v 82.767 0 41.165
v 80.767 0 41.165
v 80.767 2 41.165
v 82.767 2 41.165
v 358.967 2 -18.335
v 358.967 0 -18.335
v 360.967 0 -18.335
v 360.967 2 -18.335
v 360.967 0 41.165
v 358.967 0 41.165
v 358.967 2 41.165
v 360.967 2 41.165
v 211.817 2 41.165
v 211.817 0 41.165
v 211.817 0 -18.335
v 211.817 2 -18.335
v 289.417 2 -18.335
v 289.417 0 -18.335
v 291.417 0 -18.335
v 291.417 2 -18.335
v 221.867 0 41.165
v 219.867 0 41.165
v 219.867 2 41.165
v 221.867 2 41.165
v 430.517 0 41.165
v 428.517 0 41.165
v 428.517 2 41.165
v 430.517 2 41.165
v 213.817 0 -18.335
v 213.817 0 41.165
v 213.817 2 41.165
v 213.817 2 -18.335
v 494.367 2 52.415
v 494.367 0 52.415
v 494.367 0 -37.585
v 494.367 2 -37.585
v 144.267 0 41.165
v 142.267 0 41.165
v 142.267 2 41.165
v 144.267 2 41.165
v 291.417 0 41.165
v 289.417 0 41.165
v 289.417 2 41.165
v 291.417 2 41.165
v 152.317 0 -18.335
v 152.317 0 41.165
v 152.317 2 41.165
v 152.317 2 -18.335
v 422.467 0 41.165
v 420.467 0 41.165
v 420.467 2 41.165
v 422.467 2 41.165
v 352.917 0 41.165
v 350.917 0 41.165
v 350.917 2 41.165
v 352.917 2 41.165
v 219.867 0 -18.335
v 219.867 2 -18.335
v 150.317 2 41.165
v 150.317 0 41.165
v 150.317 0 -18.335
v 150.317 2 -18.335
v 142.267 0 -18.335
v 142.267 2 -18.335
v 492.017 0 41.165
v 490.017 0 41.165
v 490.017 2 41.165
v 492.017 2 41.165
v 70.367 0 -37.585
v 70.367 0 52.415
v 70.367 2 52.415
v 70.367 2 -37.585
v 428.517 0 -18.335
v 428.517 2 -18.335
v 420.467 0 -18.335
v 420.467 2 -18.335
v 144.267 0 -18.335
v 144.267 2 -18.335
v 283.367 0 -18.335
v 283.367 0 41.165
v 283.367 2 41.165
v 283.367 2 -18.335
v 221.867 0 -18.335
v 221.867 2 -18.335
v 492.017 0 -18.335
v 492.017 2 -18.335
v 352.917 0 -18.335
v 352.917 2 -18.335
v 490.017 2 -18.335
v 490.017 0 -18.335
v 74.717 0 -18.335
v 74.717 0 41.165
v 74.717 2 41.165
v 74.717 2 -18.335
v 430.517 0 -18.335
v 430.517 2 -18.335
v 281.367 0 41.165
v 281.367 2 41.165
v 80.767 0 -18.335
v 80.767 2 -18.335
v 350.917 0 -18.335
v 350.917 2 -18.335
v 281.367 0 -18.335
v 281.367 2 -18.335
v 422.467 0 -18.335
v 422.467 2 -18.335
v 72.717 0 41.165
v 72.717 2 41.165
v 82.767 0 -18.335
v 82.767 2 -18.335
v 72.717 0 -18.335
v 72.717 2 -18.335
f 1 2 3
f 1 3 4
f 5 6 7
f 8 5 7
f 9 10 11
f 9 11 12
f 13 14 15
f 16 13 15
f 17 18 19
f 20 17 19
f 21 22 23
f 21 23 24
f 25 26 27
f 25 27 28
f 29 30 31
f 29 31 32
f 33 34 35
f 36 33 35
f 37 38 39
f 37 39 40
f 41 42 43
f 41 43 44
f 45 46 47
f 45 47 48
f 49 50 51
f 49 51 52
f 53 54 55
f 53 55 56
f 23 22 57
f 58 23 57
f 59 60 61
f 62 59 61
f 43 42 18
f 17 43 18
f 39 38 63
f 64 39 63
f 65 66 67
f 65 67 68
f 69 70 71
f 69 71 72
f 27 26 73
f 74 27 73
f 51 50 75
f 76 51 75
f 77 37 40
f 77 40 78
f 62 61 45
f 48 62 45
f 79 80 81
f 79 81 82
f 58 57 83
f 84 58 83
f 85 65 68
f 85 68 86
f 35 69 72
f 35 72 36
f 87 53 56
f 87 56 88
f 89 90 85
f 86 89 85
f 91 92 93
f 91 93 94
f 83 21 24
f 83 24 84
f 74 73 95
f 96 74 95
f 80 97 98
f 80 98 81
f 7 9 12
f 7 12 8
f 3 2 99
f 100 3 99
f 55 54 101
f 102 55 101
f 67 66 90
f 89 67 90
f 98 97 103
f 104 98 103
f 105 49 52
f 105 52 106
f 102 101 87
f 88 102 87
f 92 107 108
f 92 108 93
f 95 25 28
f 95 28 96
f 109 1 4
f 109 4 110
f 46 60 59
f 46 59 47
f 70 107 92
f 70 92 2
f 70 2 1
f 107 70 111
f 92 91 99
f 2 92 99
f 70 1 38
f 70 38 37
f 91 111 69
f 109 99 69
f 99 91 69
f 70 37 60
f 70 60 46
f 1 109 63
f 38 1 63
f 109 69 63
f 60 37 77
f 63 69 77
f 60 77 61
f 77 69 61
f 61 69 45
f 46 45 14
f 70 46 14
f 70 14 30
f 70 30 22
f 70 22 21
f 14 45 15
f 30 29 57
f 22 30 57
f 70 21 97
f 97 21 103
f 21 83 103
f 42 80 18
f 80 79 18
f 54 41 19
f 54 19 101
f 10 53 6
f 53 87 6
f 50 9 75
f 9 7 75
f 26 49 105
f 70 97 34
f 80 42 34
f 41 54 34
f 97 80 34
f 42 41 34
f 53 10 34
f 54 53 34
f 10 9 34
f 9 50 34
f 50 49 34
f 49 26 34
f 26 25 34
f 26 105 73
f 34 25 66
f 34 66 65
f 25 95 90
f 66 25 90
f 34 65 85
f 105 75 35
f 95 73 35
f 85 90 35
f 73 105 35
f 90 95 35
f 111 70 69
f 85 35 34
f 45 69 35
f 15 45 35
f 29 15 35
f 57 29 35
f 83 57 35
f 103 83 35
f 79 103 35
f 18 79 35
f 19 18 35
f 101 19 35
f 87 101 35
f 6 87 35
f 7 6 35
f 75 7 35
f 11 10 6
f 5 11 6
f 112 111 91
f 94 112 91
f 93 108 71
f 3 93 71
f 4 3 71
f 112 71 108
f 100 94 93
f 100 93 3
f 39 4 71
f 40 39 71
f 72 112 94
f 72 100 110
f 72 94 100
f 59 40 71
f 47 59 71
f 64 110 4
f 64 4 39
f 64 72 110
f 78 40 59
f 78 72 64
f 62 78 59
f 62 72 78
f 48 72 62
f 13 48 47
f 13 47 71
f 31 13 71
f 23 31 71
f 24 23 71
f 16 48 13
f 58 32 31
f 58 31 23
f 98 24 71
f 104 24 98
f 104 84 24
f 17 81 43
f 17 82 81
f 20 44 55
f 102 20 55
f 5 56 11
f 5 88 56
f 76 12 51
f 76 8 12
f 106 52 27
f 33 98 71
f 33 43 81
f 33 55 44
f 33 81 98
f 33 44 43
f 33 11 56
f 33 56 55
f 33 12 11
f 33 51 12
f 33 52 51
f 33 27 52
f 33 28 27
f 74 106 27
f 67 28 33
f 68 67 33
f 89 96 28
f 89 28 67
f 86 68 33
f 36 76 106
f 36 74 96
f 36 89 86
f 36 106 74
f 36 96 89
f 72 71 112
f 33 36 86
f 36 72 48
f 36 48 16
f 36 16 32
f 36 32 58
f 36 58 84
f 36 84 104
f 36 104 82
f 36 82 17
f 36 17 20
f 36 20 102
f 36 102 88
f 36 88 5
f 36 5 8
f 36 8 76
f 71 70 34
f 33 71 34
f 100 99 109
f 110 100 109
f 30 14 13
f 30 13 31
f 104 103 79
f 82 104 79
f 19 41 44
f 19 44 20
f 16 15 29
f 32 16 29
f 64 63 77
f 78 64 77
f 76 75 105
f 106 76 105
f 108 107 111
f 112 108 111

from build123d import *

# Parameters (mm, degrees)
SKETCH2_W           = 424
SKETCH2_H           = 90
SKETCH2_W_2         = 2
SKETCH2_H_2         = 59.5
BOSS_EXTRUDE1_DEPTH = 2


with BuildPart() as part:
    # Sketch2 → Boss-Extrude1 (new body)
    with BuildSketch(Plane(origin=(0, 0, 0), x_dir=(1, 0, 0), z_dir=(0, 1, 0))):
        with Locations((282.3665082, -7.414833114)):
            Rectangle(SKETCH2_W, SKETCH2_H)
        with Locations((73.7165082, -11.414833114)):
            Rectangle(SKETCH2_W_2, SKETCH2_H_2, mode=Mode.SUBTRACT)
        with Locations((143.2665082, -11.414833114)):
            Rectangle(SKETCH2_W_2, SKETCH2_H_2, mode=Mode.SUBTRACT)
        with Locations((81.7665082, -11.414833114)):
            Rectangle(SKETCH2_W_2, SKETCH2_H_2, mode=Mode.SUBTRACT)
        with Locations((151.3165082, -11.414833114)):
            Rectangle(SKETCH2_W_2, SKETCH2_H_2, mode=Mode.SUBTRACT)
        with Locations((212.8165082, -11.414833114)):
            Rectangle(SKETCH2_W_2, SKETCH2_H_2, mode=Mode.SUBTRACT)
        with Locations((220.8665082, -11.414833114)):
            Rectangle(SKETCH2_W_2, SKETCH2_H_2, mode=Mode.SUBTRACT)
        with Locations((282.3665082, -11.414833114)):
            Rectangle(SKETCH2_W_2, SKETCH2_H_2, mode=Mode.SUBTRACT)
        with Locations((290.4165082, -11.414833114)):
            Rectangle(SKETCH2_W_2, SKETCH2_H_2, mode=Mode.SUBTRACT)
        with Locations((351.9165082, -11.414833114)):
            Rectangle(SKETCH2_W_2, SKETCH2_H_2, mode=Mode.SUBTRACT)
        with Locations((359.9665082, -11.414833114)):
            Rectangle(SKETCH2_W_2, SKETCH2_H_2, mode=Mode.SUBTRACT)
        with Locations((421.4665082, -11.414833114)):
            Rectangle(SKETCH2_W_2, SKETCH2_H_2, mode=Mode.SUBTRACT)
        with Locations((429.5165082, -11.414833114)):
            Rectangle(SKETCH2_W_2, SKETCH2_H_2, mode=Mode.SUBTRACT)
        with Locations((491.0165082, -11.414833114)):
            Rectangle(SKETCH2_W_2, SKETCH2_H_2, mode=Mode.SUBTRACT)
    extrude(amount=BOSS_EXTRUDE1_DEPTH)


solid = part.part
